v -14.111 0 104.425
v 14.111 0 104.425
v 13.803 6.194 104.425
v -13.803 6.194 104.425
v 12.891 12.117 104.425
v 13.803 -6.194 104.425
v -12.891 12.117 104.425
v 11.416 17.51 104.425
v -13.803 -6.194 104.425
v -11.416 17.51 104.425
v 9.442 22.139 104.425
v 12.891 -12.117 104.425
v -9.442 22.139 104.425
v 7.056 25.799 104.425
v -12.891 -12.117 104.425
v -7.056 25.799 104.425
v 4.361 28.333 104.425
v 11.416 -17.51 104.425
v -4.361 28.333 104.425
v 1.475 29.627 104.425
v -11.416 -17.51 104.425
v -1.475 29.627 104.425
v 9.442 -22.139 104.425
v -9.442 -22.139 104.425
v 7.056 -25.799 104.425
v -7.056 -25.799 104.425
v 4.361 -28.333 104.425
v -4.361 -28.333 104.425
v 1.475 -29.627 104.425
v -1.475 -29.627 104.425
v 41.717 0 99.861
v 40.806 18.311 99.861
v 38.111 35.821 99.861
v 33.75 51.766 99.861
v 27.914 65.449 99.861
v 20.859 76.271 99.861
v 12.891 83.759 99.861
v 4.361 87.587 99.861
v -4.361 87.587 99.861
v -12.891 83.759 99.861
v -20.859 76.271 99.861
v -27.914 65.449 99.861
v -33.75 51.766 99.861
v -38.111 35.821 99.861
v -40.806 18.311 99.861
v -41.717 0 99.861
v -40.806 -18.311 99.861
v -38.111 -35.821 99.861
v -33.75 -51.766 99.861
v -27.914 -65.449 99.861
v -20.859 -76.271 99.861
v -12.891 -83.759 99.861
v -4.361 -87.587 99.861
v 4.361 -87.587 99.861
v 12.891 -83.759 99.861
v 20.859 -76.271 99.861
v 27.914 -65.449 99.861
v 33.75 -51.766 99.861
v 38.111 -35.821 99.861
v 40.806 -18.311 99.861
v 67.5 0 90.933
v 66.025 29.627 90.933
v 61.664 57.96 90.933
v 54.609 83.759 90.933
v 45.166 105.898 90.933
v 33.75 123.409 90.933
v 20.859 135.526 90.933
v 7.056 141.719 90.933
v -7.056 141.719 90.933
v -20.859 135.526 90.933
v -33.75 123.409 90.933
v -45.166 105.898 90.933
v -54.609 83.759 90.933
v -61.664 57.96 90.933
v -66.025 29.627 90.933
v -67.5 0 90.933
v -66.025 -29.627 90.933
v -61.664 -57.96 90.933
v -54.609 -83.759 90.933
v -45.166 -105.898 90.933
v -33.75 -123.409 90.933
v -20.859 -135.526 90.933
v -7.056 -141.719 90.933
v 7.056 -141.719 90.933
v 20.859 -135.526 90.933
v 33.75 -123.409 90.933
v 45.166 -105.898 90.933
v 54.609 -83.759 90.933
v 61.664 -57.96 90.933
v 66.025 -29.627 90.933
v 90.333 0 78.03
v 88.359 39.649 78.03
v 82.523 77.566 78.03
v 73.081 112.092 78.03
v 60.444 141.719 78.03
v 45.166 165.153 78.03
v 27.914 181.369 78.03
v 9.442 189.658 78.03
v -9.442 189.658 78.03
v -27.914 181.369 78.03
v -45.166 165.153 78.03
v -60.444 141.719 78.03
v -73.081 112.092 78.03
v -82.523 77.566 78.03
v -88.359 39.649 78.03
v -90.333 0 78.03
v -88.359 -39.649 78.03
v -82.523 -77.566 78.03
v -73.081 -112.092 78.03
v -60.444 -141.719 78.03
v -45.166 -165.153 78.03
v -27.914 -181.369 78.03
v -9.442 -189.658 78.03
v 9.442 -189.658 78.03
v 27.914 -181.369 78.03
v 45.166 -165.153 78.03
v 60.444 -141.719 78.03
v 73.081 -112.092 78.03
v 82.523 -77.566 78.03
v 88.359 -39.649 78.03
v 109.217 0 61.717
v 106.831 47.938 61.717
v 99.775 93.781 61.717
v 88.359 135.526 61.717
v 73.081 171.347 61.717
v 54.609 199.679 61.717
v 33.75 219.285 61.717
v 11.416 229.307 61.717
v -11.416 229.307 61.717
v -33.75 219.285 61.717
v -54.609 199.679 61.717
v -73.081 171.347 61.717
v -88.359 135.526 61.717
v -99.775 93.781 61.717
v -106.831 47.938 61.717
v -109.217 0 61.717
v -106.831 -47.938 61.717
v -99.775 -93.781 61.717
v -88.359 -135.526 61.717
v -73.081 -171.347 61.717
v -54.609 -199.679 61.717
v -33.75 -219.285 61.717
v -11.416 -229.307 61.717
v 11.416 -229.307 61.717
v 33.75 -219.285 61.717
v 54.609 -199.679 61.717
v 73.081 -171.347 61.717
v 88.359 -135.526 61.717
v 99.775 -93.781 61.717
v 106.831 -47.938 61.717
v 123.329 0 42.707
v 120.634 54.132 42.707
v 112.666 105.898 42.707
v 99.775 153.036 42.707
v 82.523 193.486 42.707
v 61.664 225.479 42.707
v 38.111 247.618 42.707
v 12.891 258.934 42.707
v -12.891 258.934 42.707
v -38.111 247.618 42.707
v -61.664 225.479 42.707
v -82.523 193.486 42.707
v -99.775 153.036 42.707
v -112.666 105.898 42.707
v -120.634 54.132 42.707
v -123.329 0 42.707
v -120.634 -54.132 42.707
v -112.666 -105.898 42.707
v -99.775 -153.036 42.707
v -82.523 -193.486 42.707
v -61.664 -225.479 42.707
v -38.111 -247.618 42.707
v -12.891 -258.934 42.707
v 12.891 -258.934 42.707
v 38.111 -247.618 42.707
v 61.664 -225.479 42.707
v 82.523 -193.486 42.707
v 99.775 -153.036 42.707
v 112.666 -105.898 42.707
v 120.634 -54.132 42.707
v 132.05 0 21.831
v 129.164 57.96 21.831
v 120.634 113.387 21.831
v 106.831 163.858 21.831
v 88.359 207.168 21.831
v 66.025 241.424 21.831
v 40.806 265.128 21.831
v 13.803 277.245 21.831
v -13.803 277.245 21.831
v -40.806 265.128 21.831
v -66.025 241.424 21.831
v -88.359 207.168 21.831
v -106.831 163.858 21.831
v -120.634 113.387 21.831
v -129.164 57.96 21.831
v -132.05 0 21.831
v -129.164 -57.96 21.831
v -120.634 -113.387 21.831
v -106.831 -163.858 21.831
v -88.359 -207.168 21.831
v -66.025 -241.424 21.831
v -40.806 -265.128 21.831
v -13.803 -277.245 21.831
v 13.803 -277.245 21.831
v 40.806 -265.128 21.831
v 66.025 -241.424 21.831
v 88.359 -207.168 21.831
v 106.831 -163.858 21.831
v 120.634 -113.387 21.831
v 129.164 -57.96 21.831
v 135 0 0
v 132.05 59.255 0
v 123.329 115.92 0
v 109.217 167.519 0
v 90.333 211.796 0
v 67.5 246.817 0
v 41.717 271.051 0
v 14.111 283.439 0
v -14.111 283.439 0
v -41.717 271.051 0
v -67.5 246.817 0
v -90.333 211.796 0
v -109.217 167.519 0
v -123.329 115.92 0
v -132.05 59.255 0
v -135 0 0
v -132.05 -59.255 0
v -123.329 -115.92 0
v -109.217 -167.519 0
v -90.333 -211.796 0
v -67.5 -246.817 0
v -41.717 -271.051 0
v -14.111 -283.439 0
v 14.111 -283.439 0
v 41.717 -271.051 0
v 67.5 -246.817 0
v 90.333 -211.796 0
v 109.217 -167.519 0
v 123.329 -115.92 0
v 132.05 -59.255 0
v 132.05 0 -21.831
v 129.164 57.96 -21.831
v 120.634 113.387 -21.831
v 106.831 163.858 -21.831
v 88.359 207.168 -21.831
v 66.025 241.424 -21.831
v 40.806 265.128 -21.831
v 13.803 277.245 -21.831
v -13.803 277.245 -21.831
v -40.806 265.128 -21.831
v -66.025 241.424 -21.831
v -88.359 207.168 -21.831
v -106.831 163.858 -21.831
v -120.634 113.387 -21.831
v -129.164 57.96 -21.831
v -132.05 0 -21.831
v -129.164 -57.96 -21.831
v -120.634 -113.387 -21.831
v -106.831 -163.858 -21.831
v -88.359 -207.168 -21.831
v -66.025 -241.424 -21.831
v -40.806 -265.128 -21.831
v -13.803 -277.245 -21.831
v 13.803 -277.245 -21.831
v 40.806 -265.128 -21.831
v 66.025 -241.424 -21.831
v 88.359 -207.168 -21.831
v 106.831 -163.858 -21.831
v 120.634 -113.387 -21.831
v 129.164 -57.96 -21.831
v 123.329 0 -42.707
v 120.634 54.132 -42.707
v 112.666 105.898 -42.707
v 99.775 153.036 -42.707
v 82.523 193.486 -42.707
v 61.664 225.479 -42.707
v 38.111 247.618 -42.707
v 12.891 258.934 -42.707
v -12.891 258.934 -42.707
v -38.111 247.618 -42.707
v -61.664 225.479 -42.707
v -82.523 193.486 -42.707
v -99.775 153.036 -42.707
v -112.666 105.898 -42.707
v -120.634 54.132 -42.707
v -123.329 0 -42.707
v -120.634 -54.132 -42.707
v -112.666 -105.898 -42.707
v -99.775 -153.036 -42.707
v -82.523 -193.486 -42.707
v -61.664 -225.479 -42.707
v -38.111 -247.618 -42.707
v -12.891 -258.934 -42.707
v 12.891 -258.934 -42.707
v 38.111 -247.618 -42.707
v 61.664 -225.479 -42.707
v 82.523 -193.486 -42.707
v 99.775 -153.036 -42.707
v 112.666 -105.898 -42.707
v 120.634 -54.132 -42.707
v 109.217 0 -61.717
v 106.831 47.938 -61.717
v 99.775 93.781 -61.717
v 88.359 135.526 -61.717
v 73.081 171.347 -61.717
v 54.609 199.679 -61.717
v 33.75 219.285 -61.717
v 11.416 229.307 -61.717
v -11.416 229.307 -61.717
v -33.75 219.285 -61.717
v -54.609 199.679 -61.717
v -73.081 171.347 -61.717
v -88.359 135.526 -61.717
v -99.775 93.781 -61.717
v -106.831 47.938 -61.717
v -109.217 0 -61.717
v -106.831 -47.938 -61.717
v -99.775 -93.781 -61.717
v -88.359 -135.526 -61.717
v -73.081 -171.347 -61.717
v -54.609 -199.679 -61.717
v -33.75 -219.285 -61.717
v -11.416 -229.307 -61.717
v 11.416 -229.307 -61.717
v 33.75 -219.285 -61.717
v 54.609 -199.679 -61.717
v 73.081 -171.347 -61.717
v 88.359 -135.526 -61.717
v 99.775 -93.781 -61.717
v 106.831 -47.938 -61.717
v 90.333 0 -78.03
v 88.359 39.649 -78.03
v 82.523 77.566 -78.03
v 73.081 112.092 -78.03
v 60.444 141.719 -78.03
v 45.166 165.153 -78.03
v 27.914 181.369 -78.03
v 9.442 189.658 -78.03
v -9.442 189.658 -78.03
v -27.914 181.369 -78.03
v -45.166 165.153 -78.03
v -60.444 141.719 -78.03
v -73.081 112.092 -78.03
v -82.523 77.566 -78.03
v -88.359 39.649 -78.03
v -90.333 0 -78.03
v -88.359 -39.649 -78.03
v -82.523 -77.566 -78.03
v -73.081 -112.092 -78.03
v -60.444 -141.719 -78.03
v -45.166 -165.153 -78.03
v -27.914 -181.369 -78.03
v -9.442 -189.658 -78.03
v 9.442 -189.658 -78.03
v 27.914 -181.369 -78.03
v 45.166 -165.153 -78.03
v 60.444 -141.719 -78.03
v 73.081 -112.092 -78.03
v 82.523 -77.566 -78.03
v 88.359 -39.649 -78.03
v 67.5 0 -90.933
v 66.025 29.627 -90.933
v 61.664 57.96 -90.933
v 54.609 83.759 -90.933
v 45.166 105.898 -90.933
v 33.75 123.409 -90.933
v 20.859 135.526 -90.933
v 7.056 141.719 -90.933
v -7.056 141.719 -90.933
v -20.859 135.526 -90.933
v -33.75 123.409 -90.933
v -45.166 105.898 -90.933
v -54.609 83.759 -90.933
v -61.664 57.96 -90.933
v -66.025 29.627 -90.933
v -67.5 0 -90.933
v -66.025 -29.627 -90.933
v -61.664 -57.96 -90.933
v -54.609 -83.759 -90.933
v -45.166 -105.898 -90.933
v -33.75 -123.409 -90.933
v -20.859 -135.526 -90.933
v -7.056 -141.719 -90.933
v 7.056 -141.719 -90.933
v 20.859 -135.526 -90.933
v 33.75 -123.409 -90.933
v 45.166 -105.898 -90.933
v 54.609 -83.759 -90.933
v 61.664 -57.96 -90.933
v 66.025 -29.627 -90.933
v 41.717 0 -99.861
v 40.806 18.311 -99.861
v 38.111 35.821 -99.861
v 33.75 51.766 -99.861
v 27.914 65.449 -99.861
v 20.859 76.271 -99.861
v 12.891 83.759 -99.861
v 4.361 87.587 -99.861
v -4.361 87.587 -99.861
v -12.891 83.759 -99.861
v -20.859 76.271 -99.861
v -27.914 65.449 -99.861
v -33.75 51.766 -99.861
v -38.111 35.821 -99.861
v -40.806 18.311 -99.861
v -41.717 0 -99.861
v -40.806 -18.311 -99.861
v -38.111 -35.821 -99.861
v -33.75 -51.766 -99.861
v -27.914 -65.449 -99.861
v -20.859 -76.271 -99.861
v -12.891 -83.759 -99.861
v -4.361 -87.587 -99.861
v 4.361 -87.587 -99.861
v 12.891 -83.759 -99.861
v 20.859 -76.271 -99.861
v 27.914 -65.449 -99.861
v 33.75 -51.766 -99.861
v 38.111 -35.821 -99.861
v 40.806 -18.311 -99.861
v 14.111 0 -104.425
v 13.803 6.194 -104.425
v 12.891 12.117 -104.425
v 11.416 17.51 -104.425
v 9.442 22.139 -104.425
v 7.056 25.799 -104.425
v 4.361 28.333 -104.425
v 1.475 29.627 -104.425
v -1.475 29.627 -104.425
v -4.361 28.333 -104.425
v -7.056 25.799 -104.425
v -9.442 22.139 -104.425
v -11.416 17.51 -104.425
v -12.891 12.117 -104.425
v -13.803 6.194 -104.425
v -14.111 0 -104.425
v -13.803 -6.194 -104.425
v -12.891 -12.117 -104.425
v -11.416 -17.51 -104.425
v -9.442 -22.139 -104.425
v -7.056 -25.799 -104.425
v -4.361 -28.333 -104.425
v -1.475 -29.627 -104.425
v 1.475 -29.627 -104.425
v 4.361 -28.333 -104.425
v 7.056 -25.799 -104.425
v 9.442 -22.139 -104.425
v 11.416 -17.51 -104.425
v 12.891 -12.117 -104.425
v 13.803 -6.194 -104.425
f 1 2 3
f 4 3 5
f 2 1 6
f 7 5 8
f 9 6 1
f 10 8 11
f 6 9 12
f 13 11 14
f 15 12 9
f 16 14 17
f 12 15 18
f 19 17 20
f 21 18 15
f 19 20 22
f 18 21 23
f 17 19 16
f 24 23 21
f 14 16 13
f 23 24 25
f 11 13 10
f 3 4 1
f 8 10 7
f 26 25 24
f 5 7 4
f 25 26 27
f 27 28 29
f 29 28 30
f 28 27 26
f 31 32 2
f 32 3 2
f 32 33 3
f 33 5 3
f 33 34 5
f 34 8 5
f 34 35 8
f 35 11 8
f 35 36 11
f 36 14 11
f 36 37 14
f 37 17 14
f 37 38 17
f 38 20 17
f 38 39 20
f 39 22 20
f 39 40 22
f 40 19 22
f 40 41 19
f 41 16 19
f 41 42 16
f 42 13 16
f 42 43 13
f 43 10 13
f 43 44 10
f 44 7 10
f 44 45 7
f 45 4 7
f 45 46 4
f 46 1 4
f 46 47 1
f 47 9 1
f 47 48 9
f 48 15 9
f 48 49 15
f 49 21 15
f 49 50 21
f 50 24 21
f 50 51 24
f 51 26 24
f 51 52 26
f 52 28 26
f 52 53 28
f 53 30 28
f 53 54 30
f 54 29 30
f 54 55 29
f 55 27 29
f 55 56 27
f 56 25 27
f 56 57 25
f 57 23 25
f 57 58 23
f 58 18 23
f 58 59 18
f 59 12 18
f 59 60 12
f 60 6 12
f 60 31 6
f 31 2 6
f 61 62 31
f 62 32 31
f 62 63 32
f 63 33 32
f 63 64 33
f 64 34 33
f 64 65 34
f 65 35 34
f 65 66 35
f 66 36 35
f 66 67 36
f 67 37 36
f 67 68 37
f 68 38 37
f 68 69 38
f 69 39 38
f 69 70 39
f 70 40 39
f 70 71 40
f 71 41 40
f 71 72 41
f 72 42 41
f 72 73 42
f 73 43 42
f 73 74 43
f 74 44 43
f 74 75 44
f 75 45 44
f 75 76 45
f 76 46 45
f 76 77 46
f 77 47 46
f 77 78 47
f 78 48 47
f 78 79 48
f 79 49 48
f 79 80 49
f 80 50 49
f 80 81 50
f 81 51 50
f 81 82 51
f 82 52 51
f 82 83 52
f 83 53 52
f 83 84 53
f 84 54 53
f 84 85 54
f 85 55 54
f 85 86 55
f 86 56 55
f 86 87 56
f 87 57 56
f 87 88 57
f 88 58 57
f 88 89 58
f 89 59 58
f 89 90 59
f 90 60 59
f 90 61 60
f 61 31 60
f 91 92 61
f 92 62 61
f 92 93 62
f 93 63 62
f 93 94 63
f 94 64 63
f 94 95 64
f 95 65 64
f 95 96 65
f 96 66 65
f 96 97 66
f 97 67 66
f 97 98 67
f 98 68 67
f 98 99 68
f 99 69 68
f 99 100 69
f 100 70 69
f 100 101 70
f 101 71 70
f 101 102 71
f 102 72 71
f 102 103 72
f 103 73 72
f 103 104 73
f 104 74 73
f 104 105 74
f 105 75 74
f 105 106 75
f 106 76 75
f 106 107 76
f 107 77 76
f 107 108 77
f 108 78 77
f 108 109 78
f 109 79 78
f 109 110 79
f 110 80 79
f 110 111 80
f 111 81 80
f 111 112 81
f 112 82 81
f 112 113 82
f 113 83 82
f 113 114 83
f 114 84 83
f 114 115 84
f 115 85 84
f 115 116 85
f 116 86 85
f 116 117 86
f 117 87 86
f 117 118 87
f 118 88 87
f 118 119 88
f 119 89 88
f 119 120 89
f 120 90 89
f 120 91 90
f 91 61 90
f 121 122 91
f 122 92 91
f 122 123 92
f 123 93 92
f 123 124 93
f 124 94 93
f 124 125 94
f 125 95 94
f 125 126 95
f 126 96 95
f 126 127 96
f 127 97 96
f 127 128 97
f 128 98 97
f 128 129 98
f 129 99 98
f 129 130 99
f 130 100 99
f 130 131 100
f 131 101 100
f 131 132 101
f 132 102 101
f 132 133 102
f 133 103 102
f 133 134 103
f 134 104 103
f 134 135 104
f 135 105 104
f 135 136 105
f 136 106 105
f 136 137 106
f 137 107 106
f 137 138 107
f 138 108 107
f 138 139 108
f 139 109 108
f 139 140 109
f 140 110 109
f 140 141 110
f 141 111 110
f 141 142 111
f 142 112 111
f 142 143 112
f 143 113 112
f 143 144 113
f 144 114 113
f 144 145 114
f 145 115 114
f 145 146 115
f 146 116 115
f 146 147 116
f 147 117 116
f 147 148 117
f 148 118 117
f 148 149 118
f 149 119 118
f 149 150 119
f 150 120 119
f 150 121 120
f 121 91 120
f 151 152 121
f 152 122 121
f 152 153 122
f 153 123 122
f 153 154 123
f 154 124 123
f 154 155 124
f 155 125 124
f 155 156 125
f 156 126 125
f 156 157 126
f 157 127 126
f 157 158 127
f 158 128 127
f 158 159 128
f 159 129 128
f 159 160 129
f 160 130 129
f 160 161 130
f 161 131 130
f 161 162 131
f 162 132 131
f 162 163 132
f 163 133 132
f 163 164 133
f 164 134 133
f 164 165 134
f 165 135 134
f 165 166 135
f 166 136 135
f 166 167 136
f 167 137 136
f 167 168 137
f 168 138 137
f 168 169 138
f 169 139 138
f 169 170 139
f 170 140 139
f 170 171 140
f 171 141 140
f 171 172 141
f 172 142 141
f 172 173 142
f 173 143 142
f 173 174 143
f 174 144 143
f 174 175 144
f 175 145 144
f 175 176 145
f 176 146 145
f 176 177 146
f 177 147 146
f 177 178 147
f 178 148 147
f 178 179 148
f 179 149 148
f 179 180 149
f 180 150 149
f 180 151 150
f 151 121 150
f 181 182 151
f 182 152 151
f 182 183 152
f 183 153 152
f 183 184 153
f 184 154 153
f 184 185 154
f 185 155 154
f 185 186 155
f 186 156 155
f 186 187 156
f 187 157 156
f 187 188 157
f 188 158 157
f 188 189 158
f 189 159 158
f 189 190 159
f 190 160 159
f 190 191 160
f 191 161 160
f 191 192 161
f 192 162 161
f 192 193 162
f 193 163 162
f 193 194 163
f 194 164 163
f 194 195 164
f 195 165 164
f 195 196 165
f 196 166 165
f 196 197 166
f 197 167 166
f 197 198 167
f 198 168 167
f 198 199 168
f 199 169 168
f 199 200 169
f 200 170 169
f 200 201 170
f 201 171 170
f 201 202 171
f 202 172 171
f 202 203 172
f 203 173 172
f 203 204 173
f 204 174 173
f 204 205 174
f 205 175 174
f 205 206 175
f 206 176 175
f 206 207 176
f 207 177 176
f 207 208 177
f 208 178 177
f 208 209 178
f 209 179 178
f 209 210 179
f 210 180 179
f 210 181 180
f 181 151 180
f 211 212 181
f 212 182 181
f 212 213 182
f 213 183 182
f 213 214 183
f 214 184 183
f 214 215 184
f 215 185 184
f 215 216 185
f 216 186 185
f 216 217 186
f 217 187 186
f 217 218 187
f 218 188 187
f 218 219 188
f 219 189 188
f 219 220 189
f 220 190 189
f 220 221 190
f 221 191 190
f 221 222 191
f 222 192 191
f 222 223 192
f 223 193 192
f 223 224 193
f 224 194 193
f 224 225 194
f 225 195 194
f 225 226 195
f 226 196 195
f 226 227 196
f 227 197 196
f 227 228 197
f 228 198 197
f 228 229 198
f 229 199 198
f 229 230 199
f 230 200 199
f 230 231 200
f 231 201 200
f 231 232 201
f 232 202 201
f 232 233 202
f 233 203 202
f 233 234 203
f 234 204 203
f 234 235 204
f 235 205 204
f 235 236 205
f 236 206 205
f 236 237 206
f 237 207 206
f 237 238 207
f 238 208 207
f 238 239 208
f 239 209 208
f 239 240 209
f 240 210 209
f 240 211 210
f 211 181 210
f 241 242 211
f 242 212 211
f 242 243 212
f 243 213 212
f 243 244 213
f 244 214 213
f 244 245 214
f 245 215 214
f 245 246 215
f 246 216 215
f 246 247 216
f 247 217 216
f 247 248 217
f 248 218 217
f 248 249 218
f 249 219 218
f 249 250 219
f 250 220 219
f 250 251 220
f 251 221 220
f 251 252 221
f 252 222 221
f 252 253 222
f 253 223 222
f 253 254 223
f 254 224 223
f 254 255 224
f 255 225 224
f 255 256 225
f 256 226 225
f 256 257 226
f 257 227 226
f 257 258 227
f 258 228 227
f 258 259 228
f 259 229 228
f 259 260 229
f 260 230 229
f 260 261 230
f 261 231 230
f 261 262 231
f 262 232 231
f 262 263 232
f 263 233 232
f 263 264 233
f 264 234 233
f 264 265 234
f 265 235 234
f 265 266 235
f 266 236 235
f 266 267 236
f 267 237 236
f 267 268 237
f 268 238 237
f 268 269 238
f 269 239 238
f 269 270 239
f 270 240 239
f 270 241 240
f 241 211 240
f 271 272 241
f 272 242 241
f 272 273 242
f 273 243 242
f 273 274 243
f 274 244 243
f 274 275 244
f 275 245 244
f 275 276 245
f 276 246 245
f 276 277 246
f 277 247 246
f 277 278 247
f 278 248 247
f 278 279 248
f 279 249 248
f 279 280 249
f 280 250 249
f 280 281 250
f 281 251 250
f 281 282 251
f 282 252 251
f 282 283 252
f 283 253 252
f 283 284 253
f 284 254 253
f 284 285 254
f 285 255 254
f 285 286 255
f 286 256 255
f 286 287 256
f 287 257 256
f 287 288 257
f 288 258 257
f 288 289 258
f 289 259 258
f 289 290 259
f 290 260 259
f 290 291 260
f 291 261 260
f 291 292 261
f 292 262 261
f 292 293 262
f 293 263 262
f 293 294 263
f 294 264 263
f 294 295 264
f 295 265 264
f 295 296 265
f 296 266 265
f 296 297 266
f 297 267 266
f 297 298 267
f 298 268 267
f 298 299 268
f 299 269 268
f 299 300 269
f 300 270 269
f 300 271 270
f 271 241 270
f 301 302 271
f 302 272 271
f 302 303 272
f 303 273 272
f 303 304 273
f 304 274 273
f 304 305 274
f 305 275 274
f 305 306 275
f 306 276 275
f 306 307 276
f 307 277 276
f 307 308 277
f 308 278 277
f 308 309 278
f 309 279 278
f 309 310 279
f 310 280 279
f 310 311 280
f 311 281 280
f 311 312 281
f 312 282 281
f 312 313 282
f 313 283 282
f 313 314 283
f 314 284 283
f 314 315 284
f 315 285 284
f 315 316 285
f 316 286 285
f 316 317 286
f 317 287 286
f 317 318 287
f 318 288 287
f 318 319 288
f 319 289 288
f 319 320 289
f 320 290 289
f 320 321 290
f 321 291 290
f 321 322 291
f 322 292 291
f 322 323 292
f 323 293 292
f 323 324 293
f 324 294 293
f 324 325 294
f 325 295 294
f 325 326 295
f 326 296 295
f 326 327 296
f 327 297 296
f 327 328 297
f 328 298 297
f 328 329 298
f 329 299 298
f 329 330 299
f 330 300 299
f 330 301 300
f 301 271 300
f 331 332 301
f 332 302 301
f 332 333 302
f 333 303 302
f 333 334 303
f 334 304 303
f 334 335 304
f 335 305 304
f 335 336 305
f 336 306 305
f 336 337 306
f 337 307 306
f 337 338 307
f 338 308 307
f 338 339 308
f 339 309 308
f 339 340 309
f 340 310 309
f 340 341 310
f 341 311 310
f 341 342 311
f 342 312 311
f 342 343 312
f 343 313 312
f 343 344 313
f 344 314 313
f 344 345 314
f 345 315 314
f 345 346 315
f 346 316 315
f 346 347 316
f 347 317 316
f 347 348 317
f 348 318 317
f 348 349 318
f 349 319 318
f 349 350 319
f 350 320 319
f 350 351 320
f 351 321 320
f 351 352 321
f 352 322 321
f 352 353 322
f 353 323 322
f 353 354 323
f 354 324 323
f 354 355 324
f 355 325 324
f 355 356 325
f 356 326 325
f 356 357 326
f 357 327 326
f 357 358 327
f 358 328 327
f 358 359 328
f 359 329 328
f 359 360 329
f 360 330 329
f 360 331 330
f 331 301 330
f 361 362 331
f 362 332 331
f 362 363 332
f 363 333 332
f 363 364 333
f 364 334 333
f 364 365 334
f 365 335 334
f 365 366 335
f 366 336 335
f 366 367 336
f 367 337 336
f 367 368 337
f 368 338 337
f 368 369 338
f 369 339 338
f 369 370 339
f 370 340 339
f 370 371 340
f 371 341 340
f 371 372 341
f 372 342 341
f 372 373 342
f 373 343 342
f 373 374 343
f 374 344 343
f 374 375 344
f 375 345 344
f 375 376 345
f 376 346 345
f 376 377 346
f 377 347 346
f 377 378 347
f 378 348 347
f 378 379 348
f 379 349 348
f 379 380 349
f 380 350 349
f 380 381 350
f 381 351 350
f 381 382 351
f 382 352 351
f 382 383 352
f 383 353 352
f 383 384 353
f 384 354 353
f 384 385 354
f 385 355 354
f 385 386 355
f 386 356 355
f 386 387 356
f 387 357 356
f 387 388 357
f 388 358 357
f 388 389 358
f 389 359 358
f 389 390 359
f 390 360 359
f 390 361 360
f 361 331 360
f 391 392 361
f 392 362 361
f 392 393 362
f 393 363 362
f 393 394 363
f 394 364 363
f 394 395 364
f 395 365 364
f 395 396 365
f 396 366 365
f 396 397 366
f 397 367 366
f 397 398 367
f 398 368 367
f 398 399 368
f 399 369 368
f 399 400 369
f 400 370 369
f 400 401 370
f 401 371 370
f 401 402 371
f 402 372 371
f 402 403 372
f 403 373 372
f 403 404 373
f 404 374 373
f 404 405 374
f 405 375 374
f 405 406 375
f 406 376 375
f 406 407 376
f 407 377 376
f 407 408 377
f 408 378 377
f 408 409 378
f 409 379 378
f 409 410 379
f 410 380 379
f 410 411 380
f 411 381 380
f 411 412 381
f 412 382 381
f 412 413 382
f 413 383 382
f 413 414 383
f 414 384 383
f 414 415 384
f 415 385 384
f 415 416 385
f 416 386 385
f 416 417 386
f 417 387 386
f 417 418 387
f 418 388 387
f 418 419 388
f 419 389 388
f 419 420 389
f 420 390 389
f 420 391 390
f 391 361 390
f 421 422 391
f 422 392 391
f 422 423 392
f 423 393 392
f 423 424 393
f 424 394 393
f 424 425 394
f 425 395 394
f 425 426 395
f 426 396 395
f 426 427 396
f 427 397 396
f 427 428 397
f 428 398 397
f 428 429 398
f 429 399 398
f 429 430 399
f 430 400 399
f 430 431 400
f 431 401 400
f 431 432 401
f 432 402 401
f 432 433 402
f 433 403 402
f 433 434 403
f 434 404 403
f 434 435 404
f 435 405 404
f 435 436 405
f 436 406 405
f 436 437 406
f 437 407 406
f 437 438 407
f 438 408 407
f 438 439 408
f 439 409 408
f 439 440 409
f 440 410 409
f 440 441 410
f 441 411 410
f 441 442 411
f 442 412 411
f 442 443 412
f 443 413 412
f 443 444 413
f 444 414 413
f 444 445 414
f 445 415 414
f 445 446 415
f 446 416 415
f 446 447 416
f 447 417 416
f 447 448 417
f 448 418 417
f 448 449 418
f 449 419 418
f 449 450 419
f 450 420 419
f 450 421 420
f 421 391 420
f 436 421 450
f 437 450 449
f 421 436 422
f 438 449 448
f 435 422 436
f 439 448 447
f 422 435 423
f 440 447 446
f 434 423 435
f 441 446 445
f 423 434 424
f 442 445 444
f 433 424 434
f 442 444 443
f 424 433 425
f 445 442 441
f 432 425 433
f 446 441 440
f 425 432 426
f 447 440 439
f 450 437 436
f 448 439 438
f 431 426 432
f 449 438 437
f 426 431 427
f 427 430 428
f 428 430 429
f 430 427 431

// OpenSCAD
// Generated by SolidPython 1.0.1 on 2020-07-29 00:46:49


scale(v = [9, 19, 7]) {
	sphere(r = 15);
}
/***********************************************
*********      SolidPython code:      **********
************************************************
 
# import packages: SolidPython
from solid import *
from solid.utils import *
from itertools import chain, combinations, permutations


class Resize:

    def __init__(self, scad_file):
        self.scad_file = scad_file
        #self.scad_file = import_scad(scad_file)
        # cone/cylinder param:
        self.r1 = 0
        self.r2 = 0
        self.h = 0
        # rectangular prism param:
        self.w = 0
        self.l = 0
        # ellipse param:
        self.r = 0

    # import OpenScad code (file name corresponds to shape)


    # classify shape + parameters
    def assign(self, param1, param2, param3):
        if self.scad_file == 'cone.scad':
            self.r1 = param1
            self.r2 = param2
            self.h = param3
        elif self.scad_file == 'cylinder.scad':
            self.r1 = param1
            self.r2 = param2
            self.h = param3
        elif self.scad_file == 'rectangularPrism.scad':
            self.h = param1
            self.l = param2
            self.w = param3
        else:
            self.r = param1
            self.h = param2

    # resize parameters
    def iterate(self):
        x = range(3, 20, 2)
        i = 1
        if self.scad_file == 'cone.scad':
            tempList = list(permutations(x, 2))
            for temp in tempList:
                param1 = temp[0]
                param2 = temp[1]
                filepath = 'produced_scad_files/' + 'cone' + str(param1) + '_' + str(param2) + '_' + '.scad'
                scad_render_to_file(cylinder(h=param1, r1=param2, r2=0), filepath)

        elif self.scad_file == 'cylinder.scad':
            tempList = list(permutations(x, 3))
            for temp in tempList:
                param1 = temp[0]
                param2 = temp[1]
                filepath = 'produced_scad_files/' + 'cylinder' + str(param1) + '_' + str(param2) + '_' + '.scad'
                scad_render_to_file(cylinder(h=param1, r1=param2, r2=param2), filepath)

        elif self.scad_file == 'rectangularPrism.scad':
            tempList = list(permutations(x, 3))
            for temp in tempList:
                param1 = temp[0]
                param2 = temp[1]
                param3 = temp[2]
                filepath = 'produced_scad_files/' + 'rectangularPrism' + str(param1) + '_' + str(param2) + '_' + str(
                    param3) + '.scad'
                scad_render_to_file(cube(size=(param1, param2, param3)), filepath)

        elif self.scad_file == 'ellipse.scad':
            tempList = list(permutations(x, 4))
            for temp in tempList:
                param1 = temp[0]
                param2 = temp[1]
                param3 = temp[2]
                param4 = temp[3]
                filepath = 'produced_scad_files/' + 'ellipse' + str(param1) + '_' + str(param2) + '_' + str(param3) + '_' + str(param4) + '.scad'
                scad_render_to_file(scale([param1, param2, param3])(sphere(r=param4)), filepath)

    def render_to_scadfile(self):
        scad_render_to_file(scad, 'example.scad') 
 
************************************************/
